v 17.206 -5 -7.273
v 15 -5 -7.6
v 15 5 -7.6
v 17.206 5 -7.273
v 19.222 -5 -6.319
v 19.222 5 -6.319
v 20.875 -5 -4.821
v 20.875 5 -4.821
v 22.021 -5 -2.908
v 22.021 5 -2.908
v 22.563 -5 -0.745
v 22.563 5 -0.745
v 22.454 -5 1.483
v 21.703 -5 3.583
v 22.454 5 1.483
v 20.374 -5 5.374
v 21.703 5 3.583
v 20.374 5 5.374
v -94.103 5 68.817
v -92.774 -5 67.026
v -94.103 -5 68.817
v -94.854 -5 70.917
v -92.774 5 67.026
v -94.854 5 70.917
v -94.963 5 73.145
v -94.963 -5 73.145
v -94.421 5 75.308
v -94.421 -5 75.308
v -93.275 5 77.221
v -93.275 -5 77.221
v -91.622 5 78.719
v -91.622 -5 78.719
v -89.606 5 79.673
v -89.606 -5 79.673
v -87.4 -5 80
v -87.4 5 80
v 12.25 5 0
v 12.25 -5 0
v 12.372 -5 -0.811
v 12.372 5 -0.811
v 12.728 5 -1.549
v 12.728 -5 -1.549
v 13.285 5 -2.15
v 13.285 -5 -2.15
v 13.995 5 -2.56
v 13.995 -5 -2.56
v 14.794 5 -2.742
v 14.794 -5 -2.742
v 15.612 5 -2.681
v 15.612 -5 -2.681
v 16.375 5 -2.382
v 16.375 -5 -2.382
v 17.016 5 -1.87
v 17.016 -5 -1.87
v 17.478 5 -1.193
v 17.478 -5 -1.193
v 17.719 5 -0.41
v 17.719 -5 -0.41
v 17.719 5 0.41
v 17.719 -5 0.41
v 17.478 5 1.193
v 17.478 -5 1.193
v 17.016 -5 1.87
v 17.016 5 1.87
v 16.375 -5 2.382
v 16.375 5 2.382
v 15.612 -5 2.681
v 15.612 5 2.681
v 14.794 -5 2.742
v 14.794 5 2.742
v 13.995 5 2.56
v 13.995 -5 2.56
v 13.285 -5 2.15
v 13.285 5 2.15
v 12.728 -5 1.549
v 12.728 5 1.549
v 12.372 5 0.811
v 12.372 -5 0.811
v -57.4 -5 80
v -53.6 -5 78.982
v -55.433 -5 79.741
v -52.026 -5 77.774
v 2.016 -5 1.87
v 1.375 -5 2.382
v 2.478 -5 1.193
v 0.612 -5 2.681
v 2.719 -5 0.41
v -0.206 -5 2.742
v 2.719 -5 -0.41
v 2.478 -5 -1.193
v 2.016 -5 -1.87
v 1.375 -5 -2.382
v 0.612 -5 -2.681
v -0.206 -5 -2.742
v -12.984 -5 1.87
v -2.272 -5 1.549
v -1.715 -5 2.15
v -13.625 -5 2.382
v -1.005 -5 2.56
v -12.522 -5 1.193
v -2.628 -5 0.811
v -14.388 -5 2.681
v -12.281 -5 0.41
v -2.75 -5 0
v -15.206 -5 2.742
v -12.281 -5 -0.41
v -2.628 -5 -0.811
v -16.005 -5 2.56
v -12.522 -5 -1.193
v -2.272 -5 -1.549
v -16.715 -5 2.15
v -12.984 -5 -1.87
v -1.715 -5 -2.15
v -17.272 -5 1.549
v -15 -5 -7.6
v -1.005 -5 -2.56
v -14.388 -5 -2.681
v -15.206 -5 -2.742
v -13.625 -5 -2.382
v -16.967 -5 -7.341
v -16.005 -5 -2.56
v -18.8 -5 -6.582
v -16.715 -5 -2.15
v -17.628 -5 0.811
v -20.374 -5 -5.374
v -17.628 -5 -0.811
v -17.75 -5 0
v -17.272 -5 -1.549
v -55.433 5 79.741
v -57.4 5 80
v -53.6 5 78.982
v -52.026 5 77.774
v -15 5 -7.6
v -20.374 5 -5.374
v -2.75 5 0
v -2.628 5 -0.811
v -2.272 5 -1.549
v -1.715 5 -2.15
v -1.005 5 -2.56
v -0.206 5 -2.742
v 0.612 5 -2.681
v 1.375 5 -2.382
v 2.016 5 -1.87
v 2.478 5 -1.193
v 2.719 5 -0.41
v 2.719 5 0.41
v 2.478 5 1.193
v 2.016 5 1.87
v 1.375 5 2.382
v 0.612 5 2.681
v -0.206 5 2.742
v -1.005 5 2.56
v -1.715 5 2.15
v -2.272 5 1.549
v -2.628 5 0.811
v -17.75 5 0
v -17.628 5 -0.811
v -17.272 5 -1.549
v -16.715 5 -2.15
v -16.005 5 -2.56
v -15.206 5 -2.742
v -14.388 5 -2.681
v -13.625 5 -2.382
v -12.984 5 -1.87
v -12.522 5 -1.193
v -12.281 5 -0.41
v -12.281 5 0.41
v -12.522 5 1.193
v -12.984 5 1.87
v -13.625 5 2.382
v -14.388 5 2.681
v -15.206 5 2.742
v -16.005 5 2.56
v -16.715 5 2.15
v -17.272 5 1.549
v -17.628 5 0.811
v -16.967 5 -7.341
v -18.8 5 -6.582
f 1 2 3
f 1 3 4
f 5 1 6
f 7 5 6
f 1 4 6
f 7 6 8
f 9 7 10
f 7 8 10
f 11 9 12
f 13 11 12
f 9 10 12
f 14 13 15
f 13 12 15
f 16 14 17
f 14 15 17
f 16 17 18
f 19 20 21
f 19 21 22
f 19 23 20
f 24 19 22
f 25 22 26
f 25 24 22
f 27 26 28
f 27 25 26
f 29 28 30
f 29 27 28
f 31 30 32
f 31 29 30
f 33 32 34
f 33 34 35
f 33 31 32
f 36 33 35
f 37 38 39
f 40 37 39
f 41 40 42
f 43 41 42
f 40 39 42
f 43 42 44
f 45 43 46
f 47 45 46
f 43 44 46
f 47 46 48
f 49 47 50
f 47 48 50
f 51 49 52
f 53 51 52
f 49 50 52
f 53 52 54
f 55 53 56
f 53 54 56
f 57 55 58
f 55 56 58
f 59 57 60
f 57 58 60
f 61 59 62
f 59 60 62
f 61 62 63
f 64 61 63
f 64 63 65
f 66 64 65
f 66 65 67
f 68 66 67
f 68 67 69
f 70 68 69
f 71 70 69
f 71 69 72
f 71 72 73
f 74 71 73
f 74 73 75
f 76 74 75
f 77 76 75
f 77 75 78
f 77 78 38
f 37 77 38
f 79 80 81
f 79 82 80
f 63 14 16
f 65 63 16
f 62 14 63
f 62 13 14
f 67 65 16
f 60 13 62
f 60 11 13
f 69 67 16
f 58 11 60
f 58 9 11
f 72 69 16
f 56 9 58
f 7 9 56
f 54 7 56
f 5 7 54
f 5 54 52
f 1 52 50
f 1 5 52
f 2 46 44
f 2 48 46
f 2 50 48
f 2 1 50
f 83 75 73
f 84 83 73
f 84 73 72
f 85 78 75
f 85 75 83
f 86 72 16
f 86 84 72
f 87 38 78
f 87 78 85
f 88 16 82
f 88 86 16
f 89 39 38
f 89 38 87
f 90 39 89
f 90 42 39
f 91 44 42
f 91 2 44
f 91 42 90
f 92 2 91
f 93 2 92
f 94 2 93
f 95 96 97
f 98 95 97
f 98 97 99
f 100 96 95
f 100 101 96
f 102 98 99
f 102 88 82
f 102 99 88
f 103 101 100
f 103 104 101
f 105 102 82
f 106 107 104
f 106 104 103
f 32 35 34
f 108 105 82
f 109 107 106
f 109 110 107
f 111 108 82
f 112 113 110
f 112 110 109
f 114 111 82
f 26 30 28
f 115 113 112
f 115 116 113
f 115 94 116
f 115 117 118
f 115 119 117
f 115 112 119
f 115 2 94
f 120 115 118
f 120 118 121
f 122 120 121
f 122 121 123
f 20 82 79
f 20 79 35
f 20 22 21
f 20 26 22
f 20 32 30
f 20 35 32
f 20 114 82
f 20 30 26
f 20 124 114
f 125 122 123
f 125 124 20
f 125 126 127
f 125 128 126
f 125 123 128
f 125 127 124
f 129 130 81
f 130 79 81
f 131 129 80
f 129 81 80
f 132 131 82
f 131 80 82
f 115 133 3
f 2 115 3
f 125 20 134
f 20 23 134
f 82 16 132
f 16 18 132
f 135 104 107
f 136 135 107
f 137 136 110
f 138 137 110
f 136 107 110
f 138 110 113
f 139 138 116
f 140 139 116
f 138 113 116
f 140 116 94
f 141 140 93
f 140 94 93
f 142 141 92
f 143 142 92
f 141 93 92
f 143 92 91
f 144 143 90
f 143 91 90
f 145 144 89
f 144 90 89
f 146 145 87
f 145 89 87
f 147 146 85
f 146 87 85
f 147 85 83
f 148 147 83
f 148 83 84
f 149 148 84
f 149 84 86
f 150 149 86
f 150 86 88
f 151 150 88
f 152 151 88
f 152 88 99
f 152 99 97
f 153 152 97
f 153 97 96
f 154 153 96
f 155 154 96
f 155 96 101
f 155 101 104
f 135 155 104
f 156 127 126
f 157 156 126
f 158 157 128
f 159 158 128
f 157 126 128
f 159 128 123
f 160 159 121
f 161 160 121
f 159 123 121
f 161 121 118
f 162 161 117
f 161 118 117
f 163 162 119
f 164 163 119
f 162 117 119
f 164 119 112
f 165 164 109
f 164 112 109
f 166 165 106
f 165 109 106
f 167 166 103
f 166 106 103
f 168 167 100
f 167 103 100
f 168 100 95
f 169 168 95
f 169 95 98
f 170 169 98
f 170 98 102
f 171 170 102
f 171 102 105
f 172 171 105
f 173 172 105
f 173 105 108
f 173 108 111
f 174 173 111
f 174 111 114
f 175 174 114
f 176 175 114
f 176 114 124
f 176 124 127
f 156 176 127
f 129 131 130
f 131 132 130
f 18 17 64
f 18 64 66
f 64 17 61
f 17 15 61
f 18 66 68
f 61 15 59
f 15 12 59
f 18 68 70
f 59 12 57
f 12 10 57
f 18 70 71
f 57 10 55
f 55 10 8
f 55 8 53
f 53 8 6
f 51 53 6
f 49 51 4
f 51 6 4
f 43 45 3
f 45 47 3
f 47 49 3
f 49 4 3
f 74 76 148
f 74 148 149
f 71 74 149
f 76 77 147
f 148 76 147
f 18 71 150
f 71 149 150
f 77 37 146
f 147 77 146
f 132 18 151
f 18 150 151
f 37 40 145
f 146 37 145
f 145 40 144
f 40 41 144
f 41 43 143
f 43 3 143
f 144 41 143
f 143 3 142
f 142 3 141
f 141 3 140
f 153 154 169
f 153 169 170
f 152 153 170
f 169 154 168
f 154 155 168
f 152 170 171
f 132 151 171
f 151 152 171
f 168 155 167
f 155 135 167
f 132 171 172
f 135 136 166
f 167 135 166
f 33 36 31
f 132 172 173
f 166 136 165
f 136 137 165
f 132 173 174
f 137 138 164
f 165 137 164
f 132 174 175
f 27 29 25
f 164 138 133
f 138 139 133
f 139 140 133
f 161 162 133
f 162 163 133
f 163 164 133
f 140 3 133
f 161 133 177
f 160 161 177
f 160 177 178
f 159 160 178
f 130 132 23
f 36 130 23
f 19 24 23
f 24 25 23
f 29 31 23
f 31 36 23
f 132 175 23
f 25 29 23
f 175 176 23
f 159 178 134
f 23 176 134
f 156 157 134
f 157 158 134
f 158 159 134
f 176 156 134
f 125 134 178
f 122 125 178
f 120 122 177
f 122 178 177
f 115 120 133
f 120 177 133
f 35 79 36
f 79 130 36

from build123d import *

# Parameters (mm, degrees)
BOSS_EXTRUDE1_DEPTH      = 5
FILLET1_R                = 7.6
M5_CLEARANCE_HOLE1_D     = 5.5
M5_CLEARANCE_HOLE1_DEPTH = 10


with BuildPart() as part:
    # Sketch1 → Boss-Extrude1 (new body, symmetric)
    with BuildSketch(Plane(origin=(0, 0, 0), x_dir=(1, 0, 0), z_dir=(0, 1, 0))):
        with BuildLine():
            Line((-15, 7.6), (15, 7.6))
            ThreePointArc((15, 7.6), (22.021484447, 2.908394086), (20.374011537, -5.374011537))
            Line((20.374011537, -5.374011537), (-54.251976926, -80))
            Line((-54.251976926, -80), (-105.748023074, -80))
            Line((-105.748023074, -80), (-20.374011537, 5.374011537))
            ThreePointArc((-20.374011537, 5.374011537), (-17.908394086, 7.021484447), (-15, 7.6))
        make_face()
    extrude(amount=BOSS_EXTRUDE1_DEPTH, both=True)

    # Fillet1
    fillet1_edges = [part.edges().sort_by_distance(p)[0] for p in [
        (-54.251976926, 0, 80),
        (-105.748023074, 0, 80),
    ]]
    fillet(fillet1_edges, radius=FILLET1_R)

    # M5 Clearance Hole1
    with Locations(Plane(origin=(0, 5, 0), x_dir=(1, 0, 0), z_dir=(0, 1, 0))):
        with Locations((-15, 0), (0, 0), (15, 0)):
            Hole(M5_CLEARANCE_HOLE1_D / 2, depth=M5_CLEARANCE_HOLE1_DEPTH)


solid = part.part
